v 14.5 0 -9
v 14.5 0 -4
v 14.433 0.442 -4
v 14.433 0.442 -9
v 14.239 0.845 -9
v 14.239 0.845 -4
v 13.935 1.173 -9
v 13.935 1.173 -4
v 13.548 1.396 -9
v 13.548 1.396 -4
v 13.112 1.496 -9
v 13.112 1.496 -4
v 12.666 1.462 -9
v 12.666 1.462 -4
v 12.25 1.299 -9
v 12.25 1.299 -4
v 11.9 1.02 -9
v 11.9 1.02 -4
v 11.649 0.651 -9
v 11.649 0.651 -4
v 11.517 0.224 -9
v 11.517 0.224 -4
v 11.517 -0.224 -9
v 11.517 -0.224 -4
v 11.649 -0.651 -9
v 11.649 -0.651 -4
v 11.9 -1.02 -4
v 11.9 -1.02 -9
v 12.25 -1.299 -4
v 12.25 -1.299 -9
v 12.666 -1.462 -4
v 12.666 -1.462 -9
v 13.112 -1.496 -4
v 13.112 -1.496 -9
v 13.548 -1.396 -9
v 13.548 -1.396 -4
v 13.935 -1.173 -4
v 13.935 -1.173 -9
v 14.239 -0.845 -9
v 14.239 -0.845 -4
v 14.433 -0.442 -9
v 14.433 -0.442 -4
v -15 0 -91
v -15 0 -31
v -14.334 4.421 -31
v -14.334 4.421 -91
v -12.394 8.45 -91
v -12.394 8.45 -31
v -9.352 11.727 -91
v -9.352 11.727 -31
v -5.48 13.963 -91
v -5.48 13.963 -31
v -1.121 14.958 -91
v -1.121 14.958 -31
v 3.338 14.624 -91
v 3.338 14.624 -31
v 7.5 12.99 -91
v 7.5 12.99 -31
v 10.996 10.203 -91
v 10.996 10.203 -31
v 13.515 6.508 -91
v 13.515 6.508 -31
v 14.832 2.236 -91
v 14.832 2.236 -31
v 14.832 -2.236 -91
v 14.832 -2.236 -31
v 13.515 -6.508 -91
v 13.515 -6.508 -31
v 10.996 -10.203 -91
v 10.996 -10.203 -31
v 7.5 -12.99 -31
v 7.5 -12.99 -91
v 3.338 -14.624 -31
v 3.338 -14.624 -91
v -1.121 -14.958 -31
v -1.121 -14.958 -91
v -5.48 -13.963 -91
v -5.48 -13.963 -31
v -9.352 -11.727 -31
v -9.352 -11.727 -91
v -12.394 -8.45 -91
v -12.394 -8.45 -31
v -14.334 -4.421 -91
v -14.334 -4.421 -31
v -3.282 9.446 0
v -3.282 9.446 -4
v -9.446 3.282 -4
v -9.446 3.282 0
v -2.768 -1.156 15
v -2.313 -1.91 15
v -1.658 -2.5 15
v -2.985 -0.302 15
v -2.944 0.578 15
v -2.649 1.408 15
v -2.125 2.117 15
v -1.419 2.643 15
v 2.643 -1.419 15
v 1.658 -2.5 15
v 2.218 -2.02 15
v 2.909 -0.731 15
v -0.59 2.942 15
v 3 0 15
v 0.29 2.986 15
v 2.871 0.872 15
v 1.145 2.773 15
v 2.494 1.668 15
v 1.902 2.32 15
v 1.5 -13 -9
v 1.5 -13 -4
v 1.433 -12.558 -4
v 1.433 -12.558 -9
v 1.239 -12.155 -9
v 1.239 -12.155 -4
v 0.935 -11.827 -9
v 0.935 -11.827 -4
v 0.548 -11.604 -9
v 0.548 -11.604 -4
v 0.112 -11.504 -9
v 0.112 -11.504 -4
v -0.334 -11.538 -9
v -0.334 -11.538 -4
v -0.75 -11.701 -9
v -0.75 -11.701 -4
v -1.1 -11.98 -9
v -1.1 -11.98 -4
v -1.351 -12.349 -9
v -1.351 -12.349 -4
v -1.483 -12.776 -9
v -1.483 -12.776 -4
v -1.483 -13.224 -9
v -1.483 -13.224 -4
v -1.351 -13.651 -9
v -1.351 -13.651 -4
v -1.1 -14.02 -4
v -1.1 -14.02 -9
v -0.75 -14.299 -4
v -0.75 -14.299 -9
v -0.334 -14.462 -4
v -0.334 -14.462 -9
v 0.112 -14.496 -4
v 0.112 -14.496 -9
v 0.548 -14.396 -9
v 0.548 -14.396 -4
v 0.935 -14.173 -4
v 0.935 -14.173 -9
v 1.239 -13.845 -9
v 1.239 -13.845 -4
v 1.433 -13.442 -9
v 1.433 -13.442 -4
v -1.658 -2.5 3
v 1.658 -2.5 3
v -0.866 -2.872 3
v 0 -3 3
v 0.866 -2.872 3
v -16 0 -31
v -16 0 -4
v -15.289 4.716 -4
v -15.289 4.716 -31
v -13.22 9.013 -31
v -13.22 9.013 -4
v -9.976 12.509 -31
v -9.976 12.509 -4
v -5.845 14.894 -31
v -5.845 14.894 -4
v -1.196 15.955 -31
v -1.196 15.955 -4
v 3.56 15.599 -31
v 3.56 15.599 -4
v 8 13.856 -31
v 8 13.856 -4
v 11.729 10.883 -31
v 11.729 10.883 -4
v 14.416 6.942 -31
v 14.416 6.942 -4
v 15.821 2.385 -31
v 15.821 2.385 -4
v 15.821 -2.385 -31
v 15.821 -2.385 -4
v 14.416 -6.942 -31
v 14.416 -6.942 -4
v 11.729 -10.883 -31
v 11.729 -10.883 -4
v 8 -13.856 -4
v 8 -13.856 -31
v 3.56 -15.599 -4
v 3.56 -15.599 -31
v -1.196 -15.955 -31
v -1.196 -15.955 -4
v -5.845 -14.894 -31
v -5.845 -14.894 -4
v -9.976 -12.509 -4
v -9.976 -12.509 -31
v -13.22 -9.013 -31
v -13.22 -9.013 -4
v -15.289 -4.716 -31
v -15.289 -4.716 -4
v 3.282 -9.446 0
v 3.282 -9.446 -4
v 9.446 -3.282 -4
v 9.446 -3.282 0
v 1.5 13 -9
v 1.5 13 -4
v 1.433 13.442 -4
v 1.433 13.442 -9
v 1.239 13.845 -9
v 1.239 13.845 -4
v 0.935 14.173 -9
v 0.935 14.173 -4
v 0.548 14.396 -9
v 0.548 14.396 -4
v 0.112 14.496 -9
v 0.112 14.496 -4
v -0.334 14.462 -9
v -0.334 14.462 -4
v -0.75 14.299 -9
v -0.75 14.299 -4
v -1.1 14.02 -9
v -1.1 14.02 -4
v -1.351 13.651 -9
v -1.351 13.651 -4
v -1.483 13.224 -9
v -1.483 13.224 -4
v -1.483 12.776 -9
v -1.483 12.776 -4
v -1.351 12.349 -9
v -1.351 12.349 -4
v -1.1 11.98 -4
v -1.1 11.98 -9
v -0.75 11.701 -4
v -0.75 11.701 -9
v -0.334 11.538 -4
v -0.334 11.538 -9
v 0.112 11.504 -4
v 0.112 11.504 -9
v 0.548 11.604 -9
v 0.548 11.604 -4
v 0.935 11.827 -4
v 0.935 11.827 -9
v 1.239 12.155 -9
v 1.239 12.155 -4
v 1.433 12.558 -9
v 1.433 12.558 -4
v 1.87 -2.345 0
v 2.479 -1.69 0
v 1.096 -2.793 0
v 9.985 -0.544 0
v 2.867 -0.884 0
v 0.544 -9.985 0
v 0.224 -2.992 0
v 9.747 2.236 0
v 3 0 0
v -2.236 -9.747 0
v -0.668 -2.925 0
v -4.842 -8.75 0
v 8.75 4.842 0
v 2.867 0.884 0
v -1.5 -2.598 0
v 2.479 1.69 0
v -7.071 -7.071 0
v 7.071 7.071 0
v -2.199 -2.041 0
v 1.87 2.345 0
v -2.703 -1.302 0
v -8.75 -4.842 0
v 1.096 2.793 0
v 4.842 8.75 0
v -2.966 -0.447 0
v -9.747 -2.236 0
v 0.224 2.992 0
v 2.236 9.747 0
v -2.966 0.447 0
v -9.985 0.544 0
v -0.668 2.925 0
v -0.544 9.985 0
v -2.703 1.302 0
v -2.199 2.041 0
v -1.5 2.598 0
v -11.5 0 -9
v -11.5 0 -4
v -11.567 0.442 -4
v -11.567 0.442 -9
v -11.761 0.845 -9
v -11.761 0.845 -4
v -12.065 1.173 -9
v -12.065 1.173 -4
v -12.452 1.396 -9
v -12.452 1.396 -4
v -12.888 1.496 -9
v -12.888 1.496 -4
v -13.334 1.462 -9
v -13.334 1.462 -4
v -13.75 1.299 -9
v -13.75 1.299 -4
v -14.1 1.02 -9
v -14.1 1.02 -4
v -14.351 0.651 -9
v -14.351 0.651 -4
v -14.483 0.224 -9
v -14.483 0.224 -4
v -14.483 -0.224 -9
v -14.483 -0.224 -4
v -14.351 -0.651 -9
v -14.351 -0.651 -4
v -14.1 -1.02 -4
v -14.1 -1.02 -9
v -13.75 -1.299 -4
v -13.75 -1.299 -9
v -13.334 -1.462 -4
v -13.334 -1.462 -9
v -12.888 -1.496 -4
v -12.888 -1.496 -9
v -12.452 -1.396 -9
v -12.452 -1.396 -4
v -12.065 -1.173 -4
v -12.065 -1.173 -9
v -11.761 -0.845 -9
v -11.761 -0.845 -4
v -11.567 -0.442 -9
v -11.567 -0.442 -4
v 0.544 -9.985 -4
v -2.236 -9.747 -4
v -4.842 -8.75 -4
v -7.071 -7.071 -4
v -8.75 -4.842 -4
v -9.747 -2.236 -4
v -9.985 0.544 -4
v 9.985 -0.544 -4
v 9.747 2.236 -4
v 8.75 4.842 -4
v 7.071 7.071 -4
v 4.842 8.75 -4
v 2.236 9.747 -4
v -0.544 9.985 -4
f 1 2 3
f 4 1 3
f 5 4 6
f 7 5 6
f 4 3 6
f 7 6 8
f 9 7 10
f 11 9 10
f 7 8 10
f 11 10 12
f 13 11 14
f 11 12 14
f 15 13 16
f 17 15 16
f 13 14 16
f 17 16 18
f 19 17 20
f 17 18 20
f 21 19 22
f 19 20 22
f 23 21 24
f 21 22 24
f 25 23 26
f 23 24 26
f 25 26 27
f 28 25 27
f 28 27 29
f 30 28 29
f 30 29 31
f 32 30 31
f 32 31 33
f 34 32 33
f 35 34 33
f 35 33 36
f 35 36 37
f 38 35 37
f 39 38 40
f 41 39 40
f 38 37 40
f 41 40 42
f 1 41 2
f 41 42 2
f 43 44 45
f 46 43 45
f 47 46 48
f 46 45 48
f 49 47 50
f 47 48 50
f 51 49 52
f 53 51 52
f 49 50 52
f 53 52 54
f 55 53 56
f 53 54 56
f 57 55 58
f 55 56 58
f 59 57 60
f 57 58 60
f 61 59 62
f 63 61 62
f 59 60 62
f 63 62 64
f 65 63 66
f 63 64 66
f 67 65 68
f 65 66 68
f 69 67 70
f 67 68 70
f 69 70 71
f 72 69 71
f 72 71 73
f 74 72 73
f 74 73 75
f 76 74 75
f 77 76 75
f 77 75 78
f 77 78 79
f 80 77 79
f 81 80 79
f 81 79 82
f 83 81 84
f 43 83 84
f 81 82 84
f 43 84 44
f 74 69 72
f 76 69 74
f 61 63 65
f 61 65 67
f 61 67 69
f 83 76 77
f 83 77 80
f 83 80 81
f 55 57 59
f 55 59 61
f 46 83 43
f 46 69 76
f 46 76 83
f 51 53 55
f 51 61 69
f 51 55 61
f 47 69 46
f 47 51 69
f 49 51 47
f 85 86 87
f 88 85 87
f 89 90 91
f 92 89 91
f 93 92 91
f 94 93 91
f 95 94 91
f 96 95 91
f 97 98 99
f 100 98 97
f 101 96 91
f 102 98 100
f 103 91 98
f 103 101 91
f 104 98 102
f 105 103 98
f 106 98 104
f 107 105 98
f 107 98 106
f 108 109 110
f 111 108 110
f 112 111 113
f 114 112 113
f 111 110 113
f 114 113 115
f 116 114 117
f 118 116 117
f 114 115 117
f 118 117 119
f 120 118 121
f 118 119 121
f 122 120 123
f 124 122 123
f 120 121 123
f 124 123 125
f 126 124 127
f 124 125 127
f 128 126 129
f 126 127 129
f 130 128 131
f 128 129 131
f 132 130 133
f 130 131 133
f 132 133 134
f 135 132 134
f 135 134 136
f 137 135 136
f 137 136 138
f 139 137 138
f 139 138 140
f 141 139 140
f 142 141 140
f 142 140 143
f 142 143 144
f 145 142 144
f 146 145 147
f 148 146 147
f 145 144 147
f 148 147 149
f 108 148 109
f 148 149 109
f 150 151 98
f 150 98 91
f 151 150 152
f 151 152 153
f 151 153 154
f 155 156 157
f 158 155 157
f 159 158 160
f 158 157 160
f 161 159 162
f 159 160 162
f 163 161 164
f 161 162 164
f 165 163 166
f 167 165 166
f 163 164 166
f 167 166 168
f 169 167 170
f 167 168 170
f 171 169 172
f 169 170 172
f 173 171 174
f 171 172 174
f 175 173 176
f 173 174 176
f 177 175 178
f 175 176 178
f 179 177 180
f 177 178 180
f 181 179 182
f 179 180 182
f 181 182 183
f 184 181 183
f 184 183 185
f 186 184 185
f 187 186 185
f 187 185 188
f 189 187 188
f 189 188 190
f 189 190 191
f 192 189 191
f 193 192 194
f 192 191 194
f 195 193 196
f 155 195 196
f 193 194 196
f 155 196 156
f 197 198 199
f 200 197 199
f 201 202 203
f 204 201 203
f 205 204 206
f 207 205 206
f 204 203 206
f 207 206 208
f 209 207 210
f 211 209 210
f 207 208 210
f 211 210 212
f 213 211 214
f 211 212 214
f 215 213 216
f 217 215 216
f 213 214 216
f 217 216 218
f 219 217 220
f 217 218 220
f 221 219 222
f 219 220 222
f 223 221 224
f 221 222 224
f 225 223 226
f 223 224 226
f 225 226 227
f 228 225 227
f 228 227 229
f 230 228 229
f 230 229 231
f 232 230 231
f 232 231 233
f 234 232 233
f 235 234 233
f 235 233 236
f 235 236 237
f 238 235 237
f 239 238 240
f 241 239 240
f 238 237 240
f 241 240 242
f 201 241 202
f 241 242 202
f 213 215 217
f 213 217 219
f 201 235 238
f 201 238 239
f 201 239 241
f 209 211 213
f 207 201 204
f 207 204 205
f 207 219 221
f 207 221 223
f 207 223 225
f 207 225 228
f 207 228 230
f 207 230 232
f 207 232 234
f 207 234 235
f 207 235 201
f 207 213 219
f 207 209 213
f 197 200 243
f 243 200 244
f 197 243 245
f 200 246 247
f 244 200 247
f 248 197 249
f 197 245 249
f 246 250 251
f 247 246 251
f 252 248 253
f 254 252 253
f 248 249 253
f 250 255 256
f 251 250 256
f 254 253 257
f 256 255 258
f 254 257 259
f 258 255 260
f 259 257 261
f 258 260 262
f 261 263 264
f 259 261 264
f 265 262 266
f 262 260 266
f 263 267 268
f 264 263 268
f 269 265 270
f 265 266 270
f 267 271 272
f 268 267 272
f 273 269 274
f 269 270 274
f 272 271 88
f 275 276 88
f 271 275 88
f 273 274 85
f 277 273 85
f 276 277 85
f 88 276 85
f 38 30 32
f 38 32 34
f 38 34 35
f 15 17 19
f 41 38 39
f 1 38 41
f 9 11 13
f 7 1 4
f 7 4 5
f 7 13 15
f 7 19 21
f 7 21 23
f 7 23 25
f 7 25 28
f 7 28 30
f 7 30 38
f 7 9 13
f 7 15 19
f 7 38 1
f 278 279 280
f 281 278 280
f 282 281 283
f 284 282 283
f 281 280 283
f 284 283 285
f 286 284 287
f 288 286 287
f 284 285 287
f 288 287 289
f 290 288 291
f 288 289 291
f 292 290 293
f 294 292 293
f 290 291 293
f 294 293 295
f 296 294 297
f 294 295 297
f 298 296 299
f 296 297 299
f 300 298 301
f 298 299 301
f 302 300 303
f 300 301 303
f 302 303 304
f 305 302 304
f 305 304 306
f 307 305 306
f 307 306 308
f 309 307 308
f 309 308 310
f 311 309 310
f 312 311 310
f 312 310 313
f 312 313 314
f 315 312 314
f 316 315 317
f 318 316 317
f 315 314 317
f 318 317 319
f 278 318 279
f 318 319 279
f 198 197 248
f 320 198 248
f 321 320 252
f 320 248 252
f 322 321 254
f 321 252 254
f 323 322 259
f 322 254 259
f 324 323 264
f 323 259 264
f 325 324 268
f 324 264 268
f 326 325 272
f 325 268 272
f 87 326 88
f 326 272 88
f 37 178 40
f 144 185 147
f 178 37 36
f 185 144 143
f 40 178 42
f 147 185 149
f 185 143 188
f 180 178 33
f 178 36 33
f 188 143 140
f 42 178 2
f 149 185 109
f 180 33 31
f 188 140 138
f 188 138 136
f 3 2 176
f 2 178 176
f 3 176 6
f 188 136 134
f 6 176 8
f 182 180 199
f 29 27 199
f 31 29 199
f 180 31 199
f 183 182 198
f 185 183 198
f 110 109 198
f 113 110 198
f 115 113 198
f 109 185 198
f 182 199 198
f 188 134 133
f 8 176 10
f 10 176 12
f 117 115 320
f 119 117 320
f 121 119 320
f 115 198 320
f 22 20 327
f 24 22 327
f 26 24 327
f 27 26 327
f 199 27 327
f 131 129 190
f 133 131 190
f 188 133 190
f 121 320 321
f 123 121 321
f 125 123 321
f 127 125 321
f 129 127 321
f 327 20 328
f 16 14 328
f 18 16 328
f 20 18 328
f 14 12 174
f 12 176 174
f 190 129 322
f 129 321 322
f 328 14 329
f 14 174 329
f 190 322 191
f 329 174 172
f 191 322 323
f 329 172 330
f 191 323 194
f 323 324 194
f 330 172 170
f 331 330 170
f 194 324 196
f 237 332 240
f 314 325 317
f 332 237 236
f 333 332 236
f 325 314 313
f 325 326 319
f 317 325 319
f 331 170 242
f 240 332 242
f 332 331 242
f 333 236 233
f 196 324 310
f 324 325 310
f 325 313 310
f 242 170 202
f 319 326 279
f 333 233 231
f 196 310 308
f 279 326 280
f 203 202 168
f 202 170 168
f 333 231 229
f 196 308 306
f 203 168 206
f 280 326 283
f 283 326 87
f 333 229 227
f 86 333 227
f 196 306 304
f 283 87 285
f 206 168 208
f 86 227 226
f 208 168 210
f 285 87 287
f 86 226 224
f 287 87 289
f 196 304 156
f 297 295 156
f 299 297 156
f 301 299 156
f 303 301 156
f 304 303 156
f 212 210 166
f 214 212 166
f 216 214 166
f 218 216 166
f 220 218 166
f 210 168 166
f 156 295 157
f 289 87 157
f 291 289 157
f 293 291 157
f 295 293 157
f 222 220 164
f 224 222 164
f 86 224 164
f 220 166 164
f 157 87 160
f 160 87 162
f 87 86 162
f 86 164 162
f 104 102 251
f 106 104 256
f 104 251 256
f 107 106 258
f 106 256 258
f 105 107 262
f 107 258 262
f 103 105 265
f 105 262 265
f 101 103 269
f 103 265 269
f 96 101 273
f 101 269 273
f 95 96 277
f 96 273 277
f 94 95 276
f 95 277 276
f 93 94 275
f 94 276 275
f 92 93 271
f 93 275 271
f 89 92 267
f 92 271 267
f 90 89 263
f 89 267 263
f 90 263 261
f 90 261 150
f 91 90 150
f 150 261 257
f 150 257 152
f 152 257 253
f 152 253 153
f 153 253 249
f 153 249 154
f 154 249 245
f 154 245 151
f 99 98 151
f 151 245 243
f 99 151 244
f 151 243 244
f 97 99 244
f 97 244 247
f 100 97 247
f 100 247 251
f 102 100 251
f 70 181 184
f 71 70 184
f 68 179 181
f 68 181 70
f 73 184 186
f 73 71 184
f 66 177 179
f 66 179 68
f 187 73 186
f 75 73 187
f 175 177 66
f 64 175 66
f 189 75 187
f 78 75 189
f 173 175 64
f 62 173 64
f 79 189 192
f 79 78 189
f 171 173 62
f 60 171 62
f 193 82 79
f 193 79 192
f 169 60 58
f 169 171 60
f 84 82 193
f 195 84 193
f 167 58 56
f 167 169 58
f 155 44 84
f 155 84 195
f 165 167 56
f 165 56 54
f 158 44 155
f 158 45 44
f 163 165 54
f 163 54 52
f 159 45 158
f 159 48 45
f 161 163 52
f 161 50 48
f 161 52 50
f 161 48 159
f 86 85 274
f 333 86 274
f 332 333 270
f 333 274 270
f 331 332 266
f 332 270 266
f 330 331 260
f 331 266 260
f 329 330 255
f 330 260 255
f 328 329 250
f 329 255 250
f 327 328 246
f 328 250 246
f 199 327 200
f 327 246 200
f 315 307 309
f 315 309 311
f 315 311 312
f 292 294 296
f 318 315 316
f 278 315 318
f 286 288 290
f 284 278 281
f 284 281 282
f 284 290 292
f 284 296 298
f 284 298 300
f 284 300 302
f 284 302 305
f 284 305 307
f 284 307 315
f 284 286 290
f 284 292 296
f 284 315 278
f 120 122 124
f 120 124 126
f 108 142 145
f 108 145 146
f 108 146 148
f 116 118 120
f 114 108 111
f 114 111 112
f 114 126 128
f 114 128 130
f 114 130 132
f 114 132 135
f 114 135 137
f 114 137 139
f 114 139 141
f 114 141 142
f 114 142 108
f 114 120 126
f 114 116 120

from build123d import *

# Parameters (mm, degrees)
SKETCH1_R           = 3
BOSS_EXTRUDE1_DEPTH = 15
CUT_EXTRUDE2_START  = -12
CUT_EXTRUDE2_DEPTH  = 12
SKETCH3_R           = 10
BOSS_EXTRUDE2_DEPTH = 4
CUT_EXTRUDE3_REACH  = 25.685
SKETCH5_R           = 16
BOSS_EXTRUDE3_DEPTH = 27
SKETCH6_R           = 15
BOSS_EXTRUDE4_DEPTH = 60
SKETCH9_R           = 1.5
CUT_EXTRUDE4_DEPTH  = 5


with BuildPart() as part:
    # Sketch1 → Boss-Extrude1 (new body)
    with BuildSketch(Plane.XY):
        Circle(SKETCH1_R)
    extrude(amount=BOSS_EXTRUDE1_DEPTH)

    # Sketch2 → Cut-Extrude2 (cut)
    with BuildSketch(Plane.XY.offset(15).offset(CUT_EXTRUDE2_START)):
        with BuildLine():
            Line((1.658312395, -2.5), (-1.658312395, -2.5))
            ThreePointArc((-1.658312395, -2.5), (0, -3), (1.658312395, -2.5))
        make_face()
    extrude(amount=CUT_EXTRUDE2_DEPTH, mode=Mode.SUBTRACT)

    # Sketch3 → Boss-Extrude2 (add)
    with BuildSketch(Plane(origin=(0, 0, 0), x_dir=(-1, 0, 0), z_dir=(0, 0, -1))):
        Circle(SKETCH3_R)
    extrude(amount=BOSS_EXTRUDE2_DEPTH)

    # Sketch4 → Cut-Extrude3 (cut, up to next)
    with BuildSketch(Plane(origin=(0, 0, -4), x_dir=(-1, 0, 0), z_dir=(0, 0, -1)), mode=Mode.PRIVATE) as cut_extrude3_sk1:
        with BuildLine():
            Line((-3.281754029, -9.446168032), (-9.446168032, -3.281754029))
            ThreePointArc((-9.446168032, -3.281754029), (-7.071067812, -7.071067812), (-3.281754029, -9.446168032))
        make_face()
    cut_extrude3_tool1 = extrude(cut_extrude3_sk1.sketch, amount=-CUT_EXTRUDE3_REACH, mode=Mode.PRIVATE) & part.part
    # Sketch4 → Cut-Extrude3 (cut, up to next)
    with BuildSketch(Plane(origin=(0, 0, -4), x_dir=(-1, 0, 0), z_dir=(0, 0, -1)), mode=Mode.PRIVATE) as cut_extrude3_sk2:
        with BuildLine():
            ThreePointArc((9.446168032, 3.281754029), (7.071067812, 7.071067812), (3.281754029, 9.446168032))
            Line((3.281754029, 9.446168032), (9.446168032, 3.281754029))
        make_face()
    cut_extrude3_tool2 = extrude(cut_extrude3_sk2.sketch, amount=-CUT_EXTRUDE3_REACH, mode=Mode.PRIVATE) & part.part
    add(cut_extrude3_tool1.solids().sort_by_distance((6.648052, -6.648052, -4))[0], mode=Mode.SUBTRACT)
    add(cut_extrude3_tool2.solids().sort_by_distance((-6.648052, 6.648052, -4))[0], mode=Mode.SUBTRACT)

    # Sketch5 → Boss-Extrude3 (add)
    with BuildSketch(Plane(origin=(0, 0, -4), x_dir=(-1, 0, 0), z_dir=(0, 0, -1))):
        Circle(SKETCH5_R)
    extrude(amount=BOSS_EXTRUDE3_DEPTH)

    # Sketch6 → Boss-Extrude4 (add)
    with BuildSketch(Plane(origin=(0, 0, -31), x_dir=(-1, 0, 0), z_dir=(0, 0, -1))):
        Circle(SKETCH6_R)
    extrude(amount=BOSS_EXTRUDE4_DEPTH)

    # Sketch9 → Cut-Extrude4 (cut)
    with BuildSketch(Plane.XY.offset(-4)):
        with Locations((0, 13)):
            Circle(SKETCH9_R)
        with Locations((13, 0)):
            Circle(SKETCH9_R)
        with Locations((0, -13)):
            Circle(SKETCH9_R)
        with Locations((-13, 0)):
            Circle(SKETCH9_R)
    extrude(amount=-CUT_EXTRUDE4_DEPTH, mode=Mode.SUBTRACT)


solid = part.part
